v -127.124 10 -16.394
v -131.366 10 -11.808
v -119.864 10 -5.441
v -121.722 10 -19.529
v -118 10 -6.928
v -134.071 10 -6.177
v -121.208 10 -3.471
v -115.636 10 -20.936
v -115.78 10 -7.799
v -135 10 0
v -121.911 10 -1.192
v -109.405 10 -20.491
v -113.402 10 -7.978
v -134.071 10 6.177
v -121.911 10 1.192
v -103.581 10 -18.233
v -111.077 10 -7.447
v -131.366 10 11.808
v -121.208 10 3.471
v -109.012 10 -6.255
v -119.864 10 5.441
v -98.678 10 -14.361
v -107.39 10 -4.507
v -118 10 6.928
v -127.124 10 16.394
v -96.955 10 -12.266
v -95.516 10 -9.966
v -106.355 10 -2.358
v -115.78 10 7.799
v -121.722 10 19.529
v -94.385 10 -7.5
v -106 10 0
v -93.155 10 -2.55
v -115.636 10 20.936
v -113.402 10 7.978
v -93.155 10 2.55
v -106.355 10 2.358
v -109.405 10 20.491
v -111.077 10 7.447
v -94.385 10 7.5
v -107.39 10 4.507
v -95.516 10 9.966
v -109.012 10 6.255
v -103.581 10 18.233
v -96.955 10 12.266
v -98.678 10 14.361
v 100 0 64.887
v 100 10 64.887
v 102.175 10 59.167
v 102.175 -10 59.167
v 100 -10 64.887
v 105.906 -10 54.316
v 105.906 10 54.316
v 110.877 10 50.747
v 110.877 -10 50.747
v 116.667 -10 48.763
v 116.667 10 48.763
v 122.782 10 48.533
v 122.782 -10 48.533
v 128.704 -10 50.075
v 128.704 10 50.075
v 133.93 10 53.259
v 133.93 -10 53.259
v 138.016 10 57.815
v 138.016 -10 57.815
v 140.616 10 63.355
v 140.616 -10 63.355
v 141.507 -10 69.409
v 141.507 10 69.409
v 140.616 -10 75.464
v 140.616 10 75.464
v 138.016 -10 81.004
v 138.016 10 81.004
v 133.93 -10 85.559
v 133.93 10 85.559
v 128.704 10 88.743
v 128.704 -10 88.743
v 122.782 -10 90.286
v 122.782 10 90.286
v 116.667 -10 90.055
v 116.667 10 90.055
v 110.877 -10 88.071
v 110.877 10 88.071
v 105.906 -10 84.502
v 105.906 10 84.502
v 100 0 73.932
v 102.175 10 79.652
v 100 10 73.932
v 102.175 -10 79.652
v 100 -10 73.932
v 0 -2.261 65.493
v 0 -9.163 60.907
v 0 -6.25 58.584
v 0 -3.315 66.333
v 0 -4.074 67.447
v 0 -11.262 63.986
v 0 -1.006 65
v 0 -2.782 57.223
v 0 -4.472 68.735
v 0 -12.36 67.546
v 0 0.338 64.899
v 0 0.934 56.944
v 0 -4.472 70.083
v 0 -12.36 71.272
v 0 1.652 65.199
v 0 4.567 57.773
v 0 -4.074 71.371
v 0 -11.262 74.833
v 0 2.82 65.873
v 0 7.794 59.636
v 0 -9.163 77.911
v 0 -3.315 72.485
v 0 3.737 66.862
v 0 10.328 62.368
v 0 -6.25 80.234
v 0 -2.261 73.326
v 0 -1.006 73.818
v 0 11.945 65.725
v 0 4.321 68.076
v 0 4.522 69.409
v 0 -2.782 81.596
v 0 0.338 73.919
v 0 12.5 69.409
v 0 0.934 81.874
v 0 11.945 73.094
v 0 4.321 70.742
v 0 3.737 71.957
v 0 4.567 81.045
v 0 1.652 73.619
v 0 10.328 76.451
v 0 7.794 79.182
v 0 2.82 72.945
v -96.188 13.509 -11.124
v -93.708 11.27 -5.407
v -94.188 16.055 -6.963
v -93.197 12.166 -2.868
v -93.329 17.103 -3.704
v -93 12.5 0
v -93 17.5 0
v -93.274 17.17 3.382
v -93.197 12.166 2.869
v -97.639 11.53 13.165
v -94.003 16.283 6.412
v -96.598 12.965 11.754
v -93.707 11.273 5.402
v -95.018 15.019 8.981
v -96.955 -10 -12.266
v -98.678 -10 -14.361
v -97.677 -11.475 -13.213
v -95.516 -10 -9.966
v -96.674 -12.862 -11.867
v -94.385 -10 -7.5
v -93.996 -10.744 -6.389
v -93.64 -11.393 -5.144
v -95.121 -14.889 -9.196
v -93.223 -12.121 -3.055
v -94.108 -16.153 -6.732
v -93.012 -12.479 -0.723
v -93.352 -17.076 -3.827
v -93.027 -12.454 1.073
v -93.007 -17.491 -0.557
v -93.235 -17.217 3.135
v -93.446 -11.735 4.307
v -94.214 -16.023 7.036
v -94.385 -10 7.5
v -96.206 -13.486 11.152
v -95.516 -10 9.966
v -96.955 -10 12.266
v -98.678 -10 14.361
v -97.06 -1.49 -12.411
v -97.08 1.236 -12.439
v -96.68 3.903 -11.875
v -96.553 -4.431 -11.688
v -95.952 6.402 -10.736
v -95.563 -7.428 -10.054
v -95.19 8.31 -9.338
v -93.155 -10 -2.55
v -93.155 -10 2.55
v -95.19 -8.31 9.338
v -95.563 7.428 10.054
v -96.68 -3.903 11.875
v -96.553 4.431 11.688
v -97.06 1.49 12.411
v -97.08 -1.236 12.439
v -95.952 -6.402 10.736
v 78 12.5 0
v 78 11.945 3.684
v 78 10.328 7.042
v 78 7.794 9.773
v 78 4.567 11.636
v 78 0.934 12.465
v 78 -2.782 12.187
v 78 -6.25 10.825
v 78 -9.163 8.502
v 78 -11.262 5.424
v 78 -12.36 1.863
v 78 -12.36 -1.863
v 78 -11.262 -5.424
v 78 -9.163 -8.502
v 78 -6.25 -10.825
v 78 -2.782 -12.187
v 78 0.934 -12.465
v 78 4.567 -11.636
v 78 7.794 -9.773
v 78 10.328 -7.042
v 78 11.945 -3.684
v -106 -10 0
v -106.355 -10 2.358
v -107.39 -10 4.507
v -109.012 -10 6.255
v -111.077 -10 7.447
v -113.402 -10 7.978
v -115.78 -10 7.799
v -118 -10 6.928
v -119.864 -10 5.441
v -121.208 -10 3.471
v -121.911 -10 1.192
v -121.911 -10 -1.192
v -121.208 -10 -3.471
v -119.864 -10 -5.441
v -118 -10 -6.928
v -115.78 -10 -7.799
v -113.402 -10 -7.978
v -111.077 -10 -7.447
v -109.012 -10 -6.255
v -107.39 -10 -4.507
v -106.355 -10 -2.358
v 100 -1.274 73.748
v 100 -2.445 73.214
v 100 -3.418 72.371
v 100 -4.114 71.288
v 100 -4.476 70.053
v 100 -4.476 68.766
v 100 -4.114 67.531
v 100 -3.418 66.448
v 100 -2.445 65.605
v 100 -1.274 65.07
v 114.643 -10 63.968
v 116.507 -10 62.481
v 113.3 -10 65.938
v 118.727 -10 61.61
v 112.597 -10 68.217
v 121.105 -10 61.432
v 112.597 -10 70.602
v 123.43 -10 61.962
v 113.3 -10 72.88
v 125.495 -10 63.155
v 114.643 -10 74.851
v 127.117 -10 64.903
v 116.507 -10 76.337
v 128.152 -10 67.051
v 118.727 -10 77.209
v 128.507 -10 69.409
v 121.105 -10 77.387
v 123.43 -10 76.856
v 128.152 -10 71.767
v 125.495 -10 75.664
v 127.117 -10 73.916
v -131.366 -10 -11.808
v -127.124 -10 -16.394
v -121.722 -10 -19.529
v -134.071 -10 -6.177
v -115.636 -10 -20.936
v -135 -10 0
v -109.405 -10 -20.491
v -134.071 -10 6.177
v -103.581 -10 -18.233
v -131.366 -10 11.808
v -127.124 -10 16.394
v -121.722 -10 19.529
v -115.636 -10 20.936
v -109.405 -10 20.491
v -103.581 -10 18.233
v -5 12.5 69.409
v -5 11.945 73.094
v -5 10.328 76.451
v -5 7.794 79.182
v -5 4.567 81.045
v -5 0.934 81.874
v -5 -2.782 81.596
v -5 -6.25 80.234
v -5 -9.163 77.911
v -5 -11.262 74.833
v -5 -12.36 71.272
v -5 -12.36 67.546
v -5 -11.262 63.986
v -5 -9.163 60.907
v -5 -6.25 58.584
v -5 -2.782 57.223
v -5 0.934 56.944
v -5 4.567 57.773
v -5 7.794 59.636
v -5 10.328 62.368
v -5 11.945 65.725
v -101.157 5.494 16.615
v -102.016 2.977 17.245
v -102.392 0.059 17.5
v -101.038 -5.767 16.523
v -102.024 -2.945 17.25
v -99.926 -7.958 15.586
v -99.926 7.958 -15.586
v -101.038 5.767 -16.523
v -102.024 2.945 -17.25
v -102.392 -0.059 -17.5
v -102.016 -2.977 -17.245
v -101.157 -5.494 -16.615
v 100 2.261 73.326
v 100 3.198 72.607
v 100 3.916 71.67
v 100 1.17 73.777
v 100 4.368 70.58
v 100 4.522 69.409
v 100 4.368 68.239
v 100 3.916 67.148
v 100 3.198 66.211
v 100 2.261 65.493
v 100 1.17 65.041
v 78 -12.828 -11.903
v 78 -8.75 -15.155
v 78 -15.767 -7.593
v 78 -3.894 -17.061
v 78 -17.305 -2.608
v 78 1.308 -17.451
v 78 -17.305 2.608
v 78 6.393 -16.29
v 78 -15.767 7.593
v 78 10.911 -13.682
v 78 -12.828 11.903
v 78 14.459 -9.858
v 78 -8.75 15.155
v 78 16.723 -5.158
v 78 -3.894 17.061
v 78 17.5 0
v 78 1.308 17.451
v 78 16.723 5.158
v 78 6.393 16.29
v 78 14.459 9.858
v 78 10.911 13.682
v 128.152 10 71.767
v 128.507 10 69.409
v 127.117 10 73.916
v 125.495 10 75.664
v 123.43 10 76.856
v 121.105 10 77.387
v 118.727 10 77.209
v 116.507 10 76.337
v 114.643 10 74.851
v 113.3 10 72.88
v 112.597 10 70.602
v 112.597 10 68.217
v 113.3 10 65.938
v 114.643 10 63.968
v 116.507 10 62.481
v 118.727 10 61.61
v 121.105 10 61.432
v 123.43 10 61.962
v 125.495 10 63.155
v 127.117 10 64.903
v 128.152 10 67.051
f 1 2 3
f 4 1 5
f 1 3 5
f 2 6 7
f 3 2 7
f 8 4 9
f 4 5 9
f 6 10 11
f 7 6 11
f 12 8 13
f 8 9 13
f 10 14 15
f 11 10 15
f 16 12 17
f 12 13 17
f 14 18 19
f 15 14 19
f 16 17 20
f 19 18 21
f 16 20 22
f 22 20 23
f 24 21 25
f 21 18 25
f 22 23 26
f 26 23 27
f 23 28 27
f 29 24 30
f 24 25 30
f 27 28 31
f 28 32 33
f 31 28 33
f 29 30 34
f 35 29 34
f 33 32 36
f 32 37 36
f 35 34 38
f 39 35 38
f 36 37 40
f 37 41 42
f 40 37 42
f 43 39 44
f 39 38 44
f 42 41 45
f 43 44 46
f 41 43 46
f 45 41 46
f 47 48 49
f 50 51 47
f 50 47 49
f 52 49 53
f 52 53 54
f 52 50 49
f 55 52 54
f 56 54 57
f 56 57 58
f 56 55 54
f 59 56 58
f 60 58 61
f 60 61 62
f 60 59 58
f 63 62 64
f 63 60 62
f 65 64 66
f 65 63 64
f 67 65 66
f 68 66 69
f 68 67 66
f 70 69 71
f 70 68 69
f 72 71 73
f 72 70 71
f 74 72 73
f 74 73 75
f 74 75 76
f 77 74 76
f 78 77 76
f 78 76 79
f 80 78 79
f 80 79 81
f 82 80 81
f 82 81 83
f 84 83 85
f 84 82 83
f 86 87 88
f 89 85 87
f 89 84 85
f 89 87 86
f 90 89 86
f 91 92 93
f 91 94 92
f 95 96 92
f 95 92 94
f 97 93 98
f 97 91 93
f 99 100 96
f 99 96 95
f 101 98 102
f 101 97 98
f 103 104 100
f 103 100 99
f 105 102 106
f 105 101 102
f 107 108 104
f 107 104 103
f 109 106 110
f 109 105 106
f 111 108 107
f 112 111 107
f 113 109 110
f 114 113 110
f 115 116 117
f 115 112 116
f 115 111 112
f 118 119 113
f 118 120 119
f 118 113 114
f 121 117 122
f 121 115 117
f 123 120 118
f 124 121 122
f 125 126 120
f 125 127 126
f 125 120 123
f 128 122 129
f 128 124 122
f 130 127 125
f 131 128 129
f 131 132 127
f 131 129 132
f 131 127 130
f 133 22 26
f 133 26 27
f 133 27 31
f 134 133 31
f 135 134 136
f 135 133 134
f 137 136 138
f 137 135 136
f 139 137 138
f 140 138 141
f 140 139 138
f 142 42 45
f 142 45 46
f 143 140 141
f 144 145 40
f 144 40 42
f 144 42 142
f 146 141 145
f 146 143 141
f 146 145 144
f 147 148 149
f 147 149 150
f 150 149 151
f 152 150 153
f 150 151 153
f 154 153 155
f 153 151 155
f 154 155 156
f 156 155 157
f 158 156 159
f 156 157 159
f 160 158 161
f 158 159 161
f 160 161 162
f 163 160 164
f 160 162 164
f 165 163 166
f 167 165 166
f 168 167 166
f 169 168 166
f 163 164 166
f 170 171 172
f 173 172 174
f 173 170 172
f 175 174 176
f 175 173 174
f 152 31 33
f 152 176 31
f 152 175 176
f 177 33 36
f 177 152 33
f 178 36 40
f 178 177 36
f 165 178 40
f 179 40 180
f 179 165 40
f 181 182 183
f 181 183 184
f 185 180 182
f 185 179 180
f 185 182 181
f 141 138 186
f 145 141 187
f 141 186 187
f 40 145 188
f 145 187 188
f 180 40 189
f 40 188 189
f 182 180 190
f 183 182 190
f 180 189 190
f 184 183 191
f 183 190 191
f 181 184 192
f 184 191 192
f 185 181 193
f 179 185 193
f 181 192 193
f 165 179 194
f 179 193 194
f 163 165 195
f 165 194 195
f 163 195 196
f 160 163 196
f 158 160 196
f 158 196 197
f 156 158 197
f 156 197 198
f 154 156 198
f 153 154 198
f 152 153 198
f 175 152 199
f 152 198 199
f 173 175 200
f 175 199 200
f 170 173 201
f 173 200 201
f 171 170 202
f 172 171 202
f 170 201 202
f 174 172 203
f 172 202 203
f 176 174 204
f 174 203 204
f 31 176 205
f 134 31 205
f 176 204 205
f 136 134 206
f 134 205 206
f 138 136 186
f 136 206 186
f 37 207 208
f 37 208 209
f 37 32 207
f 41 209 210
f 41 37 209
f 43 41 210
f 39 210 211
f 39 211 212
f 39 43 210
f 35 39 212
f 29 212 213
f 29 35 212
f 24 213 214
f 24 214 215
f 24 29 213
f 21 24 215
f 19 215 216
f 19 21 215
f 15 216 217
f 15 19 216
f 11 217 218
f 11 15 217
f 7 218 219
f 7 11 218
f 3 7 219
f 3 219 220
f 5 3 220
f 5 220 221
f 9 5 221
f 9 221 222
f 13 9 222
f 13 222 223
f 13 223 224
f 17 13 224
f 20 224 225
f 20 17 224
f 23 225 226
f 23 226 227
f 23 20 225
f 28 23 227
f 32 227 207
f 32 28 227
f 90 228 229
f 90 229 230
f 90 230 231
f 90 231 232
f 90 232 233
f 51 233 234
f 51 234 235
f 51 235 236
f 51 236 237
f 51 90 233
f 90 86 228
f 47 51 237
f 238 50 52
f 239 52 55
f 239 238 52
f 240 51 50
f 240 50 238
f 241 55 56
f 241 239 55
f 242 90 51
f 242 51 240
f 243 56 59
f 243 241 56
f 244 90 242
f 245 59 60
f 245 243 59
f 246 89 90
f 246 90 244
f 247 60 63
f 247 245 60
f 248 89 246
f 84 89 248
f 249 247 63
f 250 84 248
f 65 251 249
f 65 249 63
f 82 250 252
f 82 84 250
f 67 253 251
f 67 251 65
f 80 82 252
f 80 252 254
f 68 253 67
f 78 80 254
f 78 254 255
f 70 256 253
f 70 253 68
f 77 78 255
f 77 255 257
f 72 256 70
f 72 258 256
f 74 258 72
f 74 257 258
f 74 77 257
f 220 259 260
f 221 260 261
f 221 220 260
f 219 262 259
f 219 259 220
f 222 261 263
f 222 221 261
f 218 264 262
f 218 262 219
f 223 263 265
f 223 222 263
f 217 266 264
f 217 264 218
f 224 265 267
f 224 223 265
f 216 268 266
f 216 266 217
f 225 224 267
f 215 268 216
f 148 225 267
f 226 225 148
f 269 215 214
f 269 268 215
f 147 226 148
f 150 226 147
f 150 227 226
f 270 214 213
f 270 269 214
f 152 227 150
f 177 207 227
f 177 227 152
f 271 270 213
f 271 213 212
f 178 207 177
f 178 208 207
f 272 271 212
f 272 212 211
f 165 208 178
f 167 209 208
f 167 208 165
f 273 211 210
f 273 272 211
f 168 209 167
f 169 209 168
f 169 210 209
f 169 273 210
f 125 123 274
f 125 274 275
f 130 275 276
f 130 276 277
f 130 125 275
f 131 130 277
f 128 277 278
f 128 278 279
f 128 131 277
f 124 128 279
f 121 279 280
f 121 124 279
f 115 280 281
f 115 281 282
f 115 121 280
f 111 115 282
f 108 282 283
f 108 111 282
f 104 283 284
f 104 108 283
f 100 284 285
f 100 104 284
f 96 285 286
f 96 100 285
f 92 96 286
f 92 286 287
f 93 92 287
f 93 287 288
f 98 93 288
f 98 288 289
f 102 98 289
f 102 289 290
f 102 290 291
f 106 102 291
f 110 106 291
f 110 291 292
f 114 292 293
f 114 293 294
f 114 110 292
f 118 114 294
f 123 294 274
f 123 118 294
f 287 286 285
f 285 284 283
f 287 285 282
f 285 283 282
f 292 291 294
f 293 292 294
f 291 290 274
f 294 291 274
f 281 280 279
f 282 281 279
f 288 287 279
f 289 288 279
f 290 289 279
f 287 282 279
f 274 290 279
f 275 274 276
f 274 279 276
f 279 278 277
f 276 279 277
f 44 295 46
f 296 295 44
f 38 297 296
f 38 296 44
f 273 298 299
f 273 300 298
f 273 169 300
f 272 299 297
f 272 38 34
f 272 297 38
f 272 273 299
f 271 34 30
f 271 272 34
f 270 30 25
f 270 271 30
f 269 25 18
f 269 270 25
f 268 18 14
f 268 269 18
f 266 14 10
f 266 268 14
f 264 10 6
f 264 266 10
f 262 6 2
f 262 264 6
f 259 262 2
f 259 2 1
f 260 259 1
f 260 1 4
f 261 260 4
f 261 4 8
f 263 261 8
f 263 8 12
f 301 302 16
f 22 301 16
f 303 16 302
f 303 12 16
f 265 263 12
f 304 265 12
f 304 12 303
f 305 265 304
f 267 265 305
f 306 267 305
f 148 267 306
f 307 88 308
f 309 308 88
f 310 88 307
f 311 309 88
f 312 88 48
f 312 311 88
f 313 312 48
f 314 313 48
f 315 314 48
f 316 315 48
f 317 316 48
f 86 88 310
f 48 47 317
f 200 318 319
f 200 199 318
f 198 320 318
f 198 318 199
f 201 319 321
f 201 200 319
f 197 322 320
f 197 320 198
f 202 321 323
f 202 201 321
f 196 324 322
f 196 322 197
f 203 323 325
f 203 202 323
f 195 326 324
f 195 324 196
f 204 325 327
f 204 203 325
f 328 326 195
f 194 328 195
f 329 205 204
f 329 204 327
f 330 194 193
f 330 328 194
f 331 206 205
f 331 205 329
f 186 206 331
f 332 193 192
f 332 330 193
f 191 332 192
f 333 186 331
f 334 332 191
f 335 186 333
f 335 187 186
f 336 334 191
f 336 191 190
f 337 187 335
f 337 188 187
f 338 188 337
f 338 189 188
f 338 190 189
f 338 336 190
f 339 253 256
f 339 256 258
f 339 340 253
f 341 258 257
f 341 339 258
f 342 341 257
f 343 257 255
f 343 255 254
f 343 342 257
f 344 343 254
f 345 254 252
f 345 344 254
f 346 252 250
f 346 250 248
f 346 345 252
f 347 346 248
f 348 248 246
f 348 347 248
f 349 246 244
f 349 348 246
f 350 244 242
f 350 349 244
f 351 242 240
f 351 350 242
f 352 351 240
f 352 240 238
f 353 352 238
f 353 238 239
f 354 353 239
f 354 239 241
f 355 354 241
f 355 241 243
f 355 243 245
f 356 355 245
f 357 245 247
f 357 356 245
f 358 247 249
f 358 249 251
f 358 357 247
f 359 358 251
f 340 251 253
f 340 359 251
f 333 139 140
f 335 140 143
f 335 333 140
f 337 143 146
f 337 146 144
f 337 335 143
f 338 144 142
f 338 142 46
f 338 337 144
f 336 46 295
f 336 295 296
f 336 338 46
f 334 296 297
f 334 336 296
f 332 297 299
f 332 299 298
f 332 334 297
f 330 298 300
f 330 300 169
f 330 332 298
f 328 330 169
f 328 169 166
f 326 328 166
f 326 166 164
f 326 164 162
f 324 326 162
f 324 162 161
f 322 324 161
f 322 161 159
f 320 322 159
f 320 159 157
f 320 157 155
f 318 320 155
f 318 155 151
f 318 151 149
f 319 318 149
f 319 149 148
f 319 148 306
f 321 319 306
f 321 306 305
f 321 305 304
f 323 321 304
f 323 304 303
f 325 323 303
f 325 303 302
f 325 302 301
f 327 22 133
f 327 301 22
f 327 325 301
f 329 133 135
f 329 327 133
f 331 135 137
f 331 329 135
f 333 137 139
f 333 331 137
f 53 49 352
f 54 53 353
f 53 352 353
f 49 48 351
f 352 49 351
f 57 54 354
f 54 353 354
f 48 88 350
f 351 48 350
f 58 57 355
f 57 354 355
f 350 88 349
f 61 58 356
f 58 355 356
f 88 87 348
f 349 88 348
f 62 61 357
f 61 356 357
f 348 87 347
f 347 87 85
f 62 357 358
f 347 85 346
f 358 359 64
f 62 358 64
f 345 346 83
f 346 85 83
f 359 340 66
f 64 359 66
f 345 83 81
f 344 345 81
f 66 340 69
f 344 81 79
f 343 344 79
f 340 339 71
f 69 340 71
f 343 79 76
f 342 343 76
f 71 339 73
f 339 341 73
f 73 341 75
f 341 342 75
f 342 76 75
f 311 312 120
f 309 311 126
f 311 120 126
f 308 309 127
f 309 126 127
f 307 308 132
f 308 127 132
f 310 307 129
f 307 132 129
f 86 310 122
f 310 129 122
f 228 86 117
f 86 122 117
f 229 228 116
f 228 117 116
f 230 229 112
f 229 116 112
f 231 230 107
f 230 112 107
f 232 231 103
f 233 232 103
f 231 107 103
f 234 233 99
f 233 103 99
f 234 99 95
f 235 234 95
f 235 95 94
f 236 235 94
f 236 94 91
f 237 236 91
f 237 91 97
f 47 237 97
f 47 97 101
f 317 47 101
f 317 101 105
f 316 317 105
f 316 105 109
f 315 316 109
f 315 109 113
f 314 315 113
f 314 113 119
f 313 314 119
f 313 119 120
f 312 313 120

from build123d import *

# Parameters (mm, degrees)
F0_R      = 17.5
F0_R_2    = 12.5
F1_DEPTH  = 78
F2_R      = 21
F2_R_2    = 8
F3_DEPTH  = 20
F4_DEPTH  = 28
F5_R      = 4.5223485004
F6_DEPTH  = 100
F5_R_2    = 12.5
F6_FACE_R = 4.5223485004
F7_DEPTH  = 5
F9_DEPTH  = 10
F10_DEPTH = 10
F8_R      = 8
F11_DEPTH = 10


with BuildPart() as f1:
    # F0 (on Right) → F1 (new body, symmetric)
    with BuildSketch(Plane.YZ):
        Circle(F0_R)
        Circle(F0_R_2, mode=Mode.SUBTRACT)
    extrude(amount=F1_DEPTH, both=True)

    # F4 (add, through all): a face of the model
    f4_faces = [f1.faces().sort_by_distance(p)[0] for p in [
        (-78, -17.0050252532, 0),
    ]]


with BuildPart() as f3:
    # F2 (on Front) → F3 (new body, symmetric)
    with BuildSketch(Plane.XZ):
        with Locations((-114, 0)):
            Circle(F2_R)
        with Locations((-114, 0)):
            Circle(F2_R_2, mode=Mode.SUBTRACT)
    extrude(amount=F3_DEPTH, both=True)


with BuildPart() as f1_1:
    add(f1.part)

    add(f3.part)  # F4 merges F3
    extrude(f4_faces, amount=F4_DEPTH)

    # F9 (cut): a face of the model
    f9_faces = [f1_1.faces().sort_by_distance(p)[0] for p in [
        (-134.4060303038, 20, 0),
    ]]
    extrude(f9_faces, amount=-F9_DEPTH, mode=Mode.SUBTRACT)

    # F10 (cut): a face of the model
    f10_faces = [f1_1.faces().sort_by_distance(p)[0] for p in [
        (-134.4060303038, -20, 0),
    ]]
    extrude(f10_faces, amount=-F10_DEPTH, mode=Mode.SUBTRACT)


with BuildPart() as f6:
    # F5 (on Right) → F6 (new body)
    with BuildSketch(Plane.YZ):
        with Locations((0, 69.4091767073)):
            Circle(F5_R)
    extrude(amount=F6_DEPTH)

    # F5 (on Right) + F6_face (on face) → F7 (join)
    with BuildSketch(Plane.YZ):
        with Locations((0, 69.4091767073)):
            Circle(F5_R_2)
        with Locations((0, 69.4091767073)):
            Circle(F5_R, mode=Mode.SUBTRACT)
    with BuildSketch(Plane(origin=(0, 0, 69.4091767073), x_dir=(0, 1, 0), z_dir=(-1, 0, 0))):
        Circle(F6_FACE_R)
    extrude(amount=-F7_DEPTH, dir=(1, 0, 0))

    # F8 (on Front) → F11 (join, symmetric)
    with BuildSketch(Plane.XZ):
        with BuildLine():
            ThreePointArc((100, 64.8868282069), (122.7818314974, 48.5327211473), (141.5072758806, 69.4091767073))
            ThreePointArc((141.5072758806, 69.4091767073), (122.7818314974, 90.2856322672), (100, 73.9315252076))
            Line((100, 73.9315252076), (100, 64.8868282069))
        make_face()
        with Locations((120.5072758806, 69.4091767073)):
            Circle(F8_R, mode=Mode.SUBTRACT)
    extrude(amount=F11_DEPTH, both=True)


solid = Compound([f1_1.part, f6.part])
